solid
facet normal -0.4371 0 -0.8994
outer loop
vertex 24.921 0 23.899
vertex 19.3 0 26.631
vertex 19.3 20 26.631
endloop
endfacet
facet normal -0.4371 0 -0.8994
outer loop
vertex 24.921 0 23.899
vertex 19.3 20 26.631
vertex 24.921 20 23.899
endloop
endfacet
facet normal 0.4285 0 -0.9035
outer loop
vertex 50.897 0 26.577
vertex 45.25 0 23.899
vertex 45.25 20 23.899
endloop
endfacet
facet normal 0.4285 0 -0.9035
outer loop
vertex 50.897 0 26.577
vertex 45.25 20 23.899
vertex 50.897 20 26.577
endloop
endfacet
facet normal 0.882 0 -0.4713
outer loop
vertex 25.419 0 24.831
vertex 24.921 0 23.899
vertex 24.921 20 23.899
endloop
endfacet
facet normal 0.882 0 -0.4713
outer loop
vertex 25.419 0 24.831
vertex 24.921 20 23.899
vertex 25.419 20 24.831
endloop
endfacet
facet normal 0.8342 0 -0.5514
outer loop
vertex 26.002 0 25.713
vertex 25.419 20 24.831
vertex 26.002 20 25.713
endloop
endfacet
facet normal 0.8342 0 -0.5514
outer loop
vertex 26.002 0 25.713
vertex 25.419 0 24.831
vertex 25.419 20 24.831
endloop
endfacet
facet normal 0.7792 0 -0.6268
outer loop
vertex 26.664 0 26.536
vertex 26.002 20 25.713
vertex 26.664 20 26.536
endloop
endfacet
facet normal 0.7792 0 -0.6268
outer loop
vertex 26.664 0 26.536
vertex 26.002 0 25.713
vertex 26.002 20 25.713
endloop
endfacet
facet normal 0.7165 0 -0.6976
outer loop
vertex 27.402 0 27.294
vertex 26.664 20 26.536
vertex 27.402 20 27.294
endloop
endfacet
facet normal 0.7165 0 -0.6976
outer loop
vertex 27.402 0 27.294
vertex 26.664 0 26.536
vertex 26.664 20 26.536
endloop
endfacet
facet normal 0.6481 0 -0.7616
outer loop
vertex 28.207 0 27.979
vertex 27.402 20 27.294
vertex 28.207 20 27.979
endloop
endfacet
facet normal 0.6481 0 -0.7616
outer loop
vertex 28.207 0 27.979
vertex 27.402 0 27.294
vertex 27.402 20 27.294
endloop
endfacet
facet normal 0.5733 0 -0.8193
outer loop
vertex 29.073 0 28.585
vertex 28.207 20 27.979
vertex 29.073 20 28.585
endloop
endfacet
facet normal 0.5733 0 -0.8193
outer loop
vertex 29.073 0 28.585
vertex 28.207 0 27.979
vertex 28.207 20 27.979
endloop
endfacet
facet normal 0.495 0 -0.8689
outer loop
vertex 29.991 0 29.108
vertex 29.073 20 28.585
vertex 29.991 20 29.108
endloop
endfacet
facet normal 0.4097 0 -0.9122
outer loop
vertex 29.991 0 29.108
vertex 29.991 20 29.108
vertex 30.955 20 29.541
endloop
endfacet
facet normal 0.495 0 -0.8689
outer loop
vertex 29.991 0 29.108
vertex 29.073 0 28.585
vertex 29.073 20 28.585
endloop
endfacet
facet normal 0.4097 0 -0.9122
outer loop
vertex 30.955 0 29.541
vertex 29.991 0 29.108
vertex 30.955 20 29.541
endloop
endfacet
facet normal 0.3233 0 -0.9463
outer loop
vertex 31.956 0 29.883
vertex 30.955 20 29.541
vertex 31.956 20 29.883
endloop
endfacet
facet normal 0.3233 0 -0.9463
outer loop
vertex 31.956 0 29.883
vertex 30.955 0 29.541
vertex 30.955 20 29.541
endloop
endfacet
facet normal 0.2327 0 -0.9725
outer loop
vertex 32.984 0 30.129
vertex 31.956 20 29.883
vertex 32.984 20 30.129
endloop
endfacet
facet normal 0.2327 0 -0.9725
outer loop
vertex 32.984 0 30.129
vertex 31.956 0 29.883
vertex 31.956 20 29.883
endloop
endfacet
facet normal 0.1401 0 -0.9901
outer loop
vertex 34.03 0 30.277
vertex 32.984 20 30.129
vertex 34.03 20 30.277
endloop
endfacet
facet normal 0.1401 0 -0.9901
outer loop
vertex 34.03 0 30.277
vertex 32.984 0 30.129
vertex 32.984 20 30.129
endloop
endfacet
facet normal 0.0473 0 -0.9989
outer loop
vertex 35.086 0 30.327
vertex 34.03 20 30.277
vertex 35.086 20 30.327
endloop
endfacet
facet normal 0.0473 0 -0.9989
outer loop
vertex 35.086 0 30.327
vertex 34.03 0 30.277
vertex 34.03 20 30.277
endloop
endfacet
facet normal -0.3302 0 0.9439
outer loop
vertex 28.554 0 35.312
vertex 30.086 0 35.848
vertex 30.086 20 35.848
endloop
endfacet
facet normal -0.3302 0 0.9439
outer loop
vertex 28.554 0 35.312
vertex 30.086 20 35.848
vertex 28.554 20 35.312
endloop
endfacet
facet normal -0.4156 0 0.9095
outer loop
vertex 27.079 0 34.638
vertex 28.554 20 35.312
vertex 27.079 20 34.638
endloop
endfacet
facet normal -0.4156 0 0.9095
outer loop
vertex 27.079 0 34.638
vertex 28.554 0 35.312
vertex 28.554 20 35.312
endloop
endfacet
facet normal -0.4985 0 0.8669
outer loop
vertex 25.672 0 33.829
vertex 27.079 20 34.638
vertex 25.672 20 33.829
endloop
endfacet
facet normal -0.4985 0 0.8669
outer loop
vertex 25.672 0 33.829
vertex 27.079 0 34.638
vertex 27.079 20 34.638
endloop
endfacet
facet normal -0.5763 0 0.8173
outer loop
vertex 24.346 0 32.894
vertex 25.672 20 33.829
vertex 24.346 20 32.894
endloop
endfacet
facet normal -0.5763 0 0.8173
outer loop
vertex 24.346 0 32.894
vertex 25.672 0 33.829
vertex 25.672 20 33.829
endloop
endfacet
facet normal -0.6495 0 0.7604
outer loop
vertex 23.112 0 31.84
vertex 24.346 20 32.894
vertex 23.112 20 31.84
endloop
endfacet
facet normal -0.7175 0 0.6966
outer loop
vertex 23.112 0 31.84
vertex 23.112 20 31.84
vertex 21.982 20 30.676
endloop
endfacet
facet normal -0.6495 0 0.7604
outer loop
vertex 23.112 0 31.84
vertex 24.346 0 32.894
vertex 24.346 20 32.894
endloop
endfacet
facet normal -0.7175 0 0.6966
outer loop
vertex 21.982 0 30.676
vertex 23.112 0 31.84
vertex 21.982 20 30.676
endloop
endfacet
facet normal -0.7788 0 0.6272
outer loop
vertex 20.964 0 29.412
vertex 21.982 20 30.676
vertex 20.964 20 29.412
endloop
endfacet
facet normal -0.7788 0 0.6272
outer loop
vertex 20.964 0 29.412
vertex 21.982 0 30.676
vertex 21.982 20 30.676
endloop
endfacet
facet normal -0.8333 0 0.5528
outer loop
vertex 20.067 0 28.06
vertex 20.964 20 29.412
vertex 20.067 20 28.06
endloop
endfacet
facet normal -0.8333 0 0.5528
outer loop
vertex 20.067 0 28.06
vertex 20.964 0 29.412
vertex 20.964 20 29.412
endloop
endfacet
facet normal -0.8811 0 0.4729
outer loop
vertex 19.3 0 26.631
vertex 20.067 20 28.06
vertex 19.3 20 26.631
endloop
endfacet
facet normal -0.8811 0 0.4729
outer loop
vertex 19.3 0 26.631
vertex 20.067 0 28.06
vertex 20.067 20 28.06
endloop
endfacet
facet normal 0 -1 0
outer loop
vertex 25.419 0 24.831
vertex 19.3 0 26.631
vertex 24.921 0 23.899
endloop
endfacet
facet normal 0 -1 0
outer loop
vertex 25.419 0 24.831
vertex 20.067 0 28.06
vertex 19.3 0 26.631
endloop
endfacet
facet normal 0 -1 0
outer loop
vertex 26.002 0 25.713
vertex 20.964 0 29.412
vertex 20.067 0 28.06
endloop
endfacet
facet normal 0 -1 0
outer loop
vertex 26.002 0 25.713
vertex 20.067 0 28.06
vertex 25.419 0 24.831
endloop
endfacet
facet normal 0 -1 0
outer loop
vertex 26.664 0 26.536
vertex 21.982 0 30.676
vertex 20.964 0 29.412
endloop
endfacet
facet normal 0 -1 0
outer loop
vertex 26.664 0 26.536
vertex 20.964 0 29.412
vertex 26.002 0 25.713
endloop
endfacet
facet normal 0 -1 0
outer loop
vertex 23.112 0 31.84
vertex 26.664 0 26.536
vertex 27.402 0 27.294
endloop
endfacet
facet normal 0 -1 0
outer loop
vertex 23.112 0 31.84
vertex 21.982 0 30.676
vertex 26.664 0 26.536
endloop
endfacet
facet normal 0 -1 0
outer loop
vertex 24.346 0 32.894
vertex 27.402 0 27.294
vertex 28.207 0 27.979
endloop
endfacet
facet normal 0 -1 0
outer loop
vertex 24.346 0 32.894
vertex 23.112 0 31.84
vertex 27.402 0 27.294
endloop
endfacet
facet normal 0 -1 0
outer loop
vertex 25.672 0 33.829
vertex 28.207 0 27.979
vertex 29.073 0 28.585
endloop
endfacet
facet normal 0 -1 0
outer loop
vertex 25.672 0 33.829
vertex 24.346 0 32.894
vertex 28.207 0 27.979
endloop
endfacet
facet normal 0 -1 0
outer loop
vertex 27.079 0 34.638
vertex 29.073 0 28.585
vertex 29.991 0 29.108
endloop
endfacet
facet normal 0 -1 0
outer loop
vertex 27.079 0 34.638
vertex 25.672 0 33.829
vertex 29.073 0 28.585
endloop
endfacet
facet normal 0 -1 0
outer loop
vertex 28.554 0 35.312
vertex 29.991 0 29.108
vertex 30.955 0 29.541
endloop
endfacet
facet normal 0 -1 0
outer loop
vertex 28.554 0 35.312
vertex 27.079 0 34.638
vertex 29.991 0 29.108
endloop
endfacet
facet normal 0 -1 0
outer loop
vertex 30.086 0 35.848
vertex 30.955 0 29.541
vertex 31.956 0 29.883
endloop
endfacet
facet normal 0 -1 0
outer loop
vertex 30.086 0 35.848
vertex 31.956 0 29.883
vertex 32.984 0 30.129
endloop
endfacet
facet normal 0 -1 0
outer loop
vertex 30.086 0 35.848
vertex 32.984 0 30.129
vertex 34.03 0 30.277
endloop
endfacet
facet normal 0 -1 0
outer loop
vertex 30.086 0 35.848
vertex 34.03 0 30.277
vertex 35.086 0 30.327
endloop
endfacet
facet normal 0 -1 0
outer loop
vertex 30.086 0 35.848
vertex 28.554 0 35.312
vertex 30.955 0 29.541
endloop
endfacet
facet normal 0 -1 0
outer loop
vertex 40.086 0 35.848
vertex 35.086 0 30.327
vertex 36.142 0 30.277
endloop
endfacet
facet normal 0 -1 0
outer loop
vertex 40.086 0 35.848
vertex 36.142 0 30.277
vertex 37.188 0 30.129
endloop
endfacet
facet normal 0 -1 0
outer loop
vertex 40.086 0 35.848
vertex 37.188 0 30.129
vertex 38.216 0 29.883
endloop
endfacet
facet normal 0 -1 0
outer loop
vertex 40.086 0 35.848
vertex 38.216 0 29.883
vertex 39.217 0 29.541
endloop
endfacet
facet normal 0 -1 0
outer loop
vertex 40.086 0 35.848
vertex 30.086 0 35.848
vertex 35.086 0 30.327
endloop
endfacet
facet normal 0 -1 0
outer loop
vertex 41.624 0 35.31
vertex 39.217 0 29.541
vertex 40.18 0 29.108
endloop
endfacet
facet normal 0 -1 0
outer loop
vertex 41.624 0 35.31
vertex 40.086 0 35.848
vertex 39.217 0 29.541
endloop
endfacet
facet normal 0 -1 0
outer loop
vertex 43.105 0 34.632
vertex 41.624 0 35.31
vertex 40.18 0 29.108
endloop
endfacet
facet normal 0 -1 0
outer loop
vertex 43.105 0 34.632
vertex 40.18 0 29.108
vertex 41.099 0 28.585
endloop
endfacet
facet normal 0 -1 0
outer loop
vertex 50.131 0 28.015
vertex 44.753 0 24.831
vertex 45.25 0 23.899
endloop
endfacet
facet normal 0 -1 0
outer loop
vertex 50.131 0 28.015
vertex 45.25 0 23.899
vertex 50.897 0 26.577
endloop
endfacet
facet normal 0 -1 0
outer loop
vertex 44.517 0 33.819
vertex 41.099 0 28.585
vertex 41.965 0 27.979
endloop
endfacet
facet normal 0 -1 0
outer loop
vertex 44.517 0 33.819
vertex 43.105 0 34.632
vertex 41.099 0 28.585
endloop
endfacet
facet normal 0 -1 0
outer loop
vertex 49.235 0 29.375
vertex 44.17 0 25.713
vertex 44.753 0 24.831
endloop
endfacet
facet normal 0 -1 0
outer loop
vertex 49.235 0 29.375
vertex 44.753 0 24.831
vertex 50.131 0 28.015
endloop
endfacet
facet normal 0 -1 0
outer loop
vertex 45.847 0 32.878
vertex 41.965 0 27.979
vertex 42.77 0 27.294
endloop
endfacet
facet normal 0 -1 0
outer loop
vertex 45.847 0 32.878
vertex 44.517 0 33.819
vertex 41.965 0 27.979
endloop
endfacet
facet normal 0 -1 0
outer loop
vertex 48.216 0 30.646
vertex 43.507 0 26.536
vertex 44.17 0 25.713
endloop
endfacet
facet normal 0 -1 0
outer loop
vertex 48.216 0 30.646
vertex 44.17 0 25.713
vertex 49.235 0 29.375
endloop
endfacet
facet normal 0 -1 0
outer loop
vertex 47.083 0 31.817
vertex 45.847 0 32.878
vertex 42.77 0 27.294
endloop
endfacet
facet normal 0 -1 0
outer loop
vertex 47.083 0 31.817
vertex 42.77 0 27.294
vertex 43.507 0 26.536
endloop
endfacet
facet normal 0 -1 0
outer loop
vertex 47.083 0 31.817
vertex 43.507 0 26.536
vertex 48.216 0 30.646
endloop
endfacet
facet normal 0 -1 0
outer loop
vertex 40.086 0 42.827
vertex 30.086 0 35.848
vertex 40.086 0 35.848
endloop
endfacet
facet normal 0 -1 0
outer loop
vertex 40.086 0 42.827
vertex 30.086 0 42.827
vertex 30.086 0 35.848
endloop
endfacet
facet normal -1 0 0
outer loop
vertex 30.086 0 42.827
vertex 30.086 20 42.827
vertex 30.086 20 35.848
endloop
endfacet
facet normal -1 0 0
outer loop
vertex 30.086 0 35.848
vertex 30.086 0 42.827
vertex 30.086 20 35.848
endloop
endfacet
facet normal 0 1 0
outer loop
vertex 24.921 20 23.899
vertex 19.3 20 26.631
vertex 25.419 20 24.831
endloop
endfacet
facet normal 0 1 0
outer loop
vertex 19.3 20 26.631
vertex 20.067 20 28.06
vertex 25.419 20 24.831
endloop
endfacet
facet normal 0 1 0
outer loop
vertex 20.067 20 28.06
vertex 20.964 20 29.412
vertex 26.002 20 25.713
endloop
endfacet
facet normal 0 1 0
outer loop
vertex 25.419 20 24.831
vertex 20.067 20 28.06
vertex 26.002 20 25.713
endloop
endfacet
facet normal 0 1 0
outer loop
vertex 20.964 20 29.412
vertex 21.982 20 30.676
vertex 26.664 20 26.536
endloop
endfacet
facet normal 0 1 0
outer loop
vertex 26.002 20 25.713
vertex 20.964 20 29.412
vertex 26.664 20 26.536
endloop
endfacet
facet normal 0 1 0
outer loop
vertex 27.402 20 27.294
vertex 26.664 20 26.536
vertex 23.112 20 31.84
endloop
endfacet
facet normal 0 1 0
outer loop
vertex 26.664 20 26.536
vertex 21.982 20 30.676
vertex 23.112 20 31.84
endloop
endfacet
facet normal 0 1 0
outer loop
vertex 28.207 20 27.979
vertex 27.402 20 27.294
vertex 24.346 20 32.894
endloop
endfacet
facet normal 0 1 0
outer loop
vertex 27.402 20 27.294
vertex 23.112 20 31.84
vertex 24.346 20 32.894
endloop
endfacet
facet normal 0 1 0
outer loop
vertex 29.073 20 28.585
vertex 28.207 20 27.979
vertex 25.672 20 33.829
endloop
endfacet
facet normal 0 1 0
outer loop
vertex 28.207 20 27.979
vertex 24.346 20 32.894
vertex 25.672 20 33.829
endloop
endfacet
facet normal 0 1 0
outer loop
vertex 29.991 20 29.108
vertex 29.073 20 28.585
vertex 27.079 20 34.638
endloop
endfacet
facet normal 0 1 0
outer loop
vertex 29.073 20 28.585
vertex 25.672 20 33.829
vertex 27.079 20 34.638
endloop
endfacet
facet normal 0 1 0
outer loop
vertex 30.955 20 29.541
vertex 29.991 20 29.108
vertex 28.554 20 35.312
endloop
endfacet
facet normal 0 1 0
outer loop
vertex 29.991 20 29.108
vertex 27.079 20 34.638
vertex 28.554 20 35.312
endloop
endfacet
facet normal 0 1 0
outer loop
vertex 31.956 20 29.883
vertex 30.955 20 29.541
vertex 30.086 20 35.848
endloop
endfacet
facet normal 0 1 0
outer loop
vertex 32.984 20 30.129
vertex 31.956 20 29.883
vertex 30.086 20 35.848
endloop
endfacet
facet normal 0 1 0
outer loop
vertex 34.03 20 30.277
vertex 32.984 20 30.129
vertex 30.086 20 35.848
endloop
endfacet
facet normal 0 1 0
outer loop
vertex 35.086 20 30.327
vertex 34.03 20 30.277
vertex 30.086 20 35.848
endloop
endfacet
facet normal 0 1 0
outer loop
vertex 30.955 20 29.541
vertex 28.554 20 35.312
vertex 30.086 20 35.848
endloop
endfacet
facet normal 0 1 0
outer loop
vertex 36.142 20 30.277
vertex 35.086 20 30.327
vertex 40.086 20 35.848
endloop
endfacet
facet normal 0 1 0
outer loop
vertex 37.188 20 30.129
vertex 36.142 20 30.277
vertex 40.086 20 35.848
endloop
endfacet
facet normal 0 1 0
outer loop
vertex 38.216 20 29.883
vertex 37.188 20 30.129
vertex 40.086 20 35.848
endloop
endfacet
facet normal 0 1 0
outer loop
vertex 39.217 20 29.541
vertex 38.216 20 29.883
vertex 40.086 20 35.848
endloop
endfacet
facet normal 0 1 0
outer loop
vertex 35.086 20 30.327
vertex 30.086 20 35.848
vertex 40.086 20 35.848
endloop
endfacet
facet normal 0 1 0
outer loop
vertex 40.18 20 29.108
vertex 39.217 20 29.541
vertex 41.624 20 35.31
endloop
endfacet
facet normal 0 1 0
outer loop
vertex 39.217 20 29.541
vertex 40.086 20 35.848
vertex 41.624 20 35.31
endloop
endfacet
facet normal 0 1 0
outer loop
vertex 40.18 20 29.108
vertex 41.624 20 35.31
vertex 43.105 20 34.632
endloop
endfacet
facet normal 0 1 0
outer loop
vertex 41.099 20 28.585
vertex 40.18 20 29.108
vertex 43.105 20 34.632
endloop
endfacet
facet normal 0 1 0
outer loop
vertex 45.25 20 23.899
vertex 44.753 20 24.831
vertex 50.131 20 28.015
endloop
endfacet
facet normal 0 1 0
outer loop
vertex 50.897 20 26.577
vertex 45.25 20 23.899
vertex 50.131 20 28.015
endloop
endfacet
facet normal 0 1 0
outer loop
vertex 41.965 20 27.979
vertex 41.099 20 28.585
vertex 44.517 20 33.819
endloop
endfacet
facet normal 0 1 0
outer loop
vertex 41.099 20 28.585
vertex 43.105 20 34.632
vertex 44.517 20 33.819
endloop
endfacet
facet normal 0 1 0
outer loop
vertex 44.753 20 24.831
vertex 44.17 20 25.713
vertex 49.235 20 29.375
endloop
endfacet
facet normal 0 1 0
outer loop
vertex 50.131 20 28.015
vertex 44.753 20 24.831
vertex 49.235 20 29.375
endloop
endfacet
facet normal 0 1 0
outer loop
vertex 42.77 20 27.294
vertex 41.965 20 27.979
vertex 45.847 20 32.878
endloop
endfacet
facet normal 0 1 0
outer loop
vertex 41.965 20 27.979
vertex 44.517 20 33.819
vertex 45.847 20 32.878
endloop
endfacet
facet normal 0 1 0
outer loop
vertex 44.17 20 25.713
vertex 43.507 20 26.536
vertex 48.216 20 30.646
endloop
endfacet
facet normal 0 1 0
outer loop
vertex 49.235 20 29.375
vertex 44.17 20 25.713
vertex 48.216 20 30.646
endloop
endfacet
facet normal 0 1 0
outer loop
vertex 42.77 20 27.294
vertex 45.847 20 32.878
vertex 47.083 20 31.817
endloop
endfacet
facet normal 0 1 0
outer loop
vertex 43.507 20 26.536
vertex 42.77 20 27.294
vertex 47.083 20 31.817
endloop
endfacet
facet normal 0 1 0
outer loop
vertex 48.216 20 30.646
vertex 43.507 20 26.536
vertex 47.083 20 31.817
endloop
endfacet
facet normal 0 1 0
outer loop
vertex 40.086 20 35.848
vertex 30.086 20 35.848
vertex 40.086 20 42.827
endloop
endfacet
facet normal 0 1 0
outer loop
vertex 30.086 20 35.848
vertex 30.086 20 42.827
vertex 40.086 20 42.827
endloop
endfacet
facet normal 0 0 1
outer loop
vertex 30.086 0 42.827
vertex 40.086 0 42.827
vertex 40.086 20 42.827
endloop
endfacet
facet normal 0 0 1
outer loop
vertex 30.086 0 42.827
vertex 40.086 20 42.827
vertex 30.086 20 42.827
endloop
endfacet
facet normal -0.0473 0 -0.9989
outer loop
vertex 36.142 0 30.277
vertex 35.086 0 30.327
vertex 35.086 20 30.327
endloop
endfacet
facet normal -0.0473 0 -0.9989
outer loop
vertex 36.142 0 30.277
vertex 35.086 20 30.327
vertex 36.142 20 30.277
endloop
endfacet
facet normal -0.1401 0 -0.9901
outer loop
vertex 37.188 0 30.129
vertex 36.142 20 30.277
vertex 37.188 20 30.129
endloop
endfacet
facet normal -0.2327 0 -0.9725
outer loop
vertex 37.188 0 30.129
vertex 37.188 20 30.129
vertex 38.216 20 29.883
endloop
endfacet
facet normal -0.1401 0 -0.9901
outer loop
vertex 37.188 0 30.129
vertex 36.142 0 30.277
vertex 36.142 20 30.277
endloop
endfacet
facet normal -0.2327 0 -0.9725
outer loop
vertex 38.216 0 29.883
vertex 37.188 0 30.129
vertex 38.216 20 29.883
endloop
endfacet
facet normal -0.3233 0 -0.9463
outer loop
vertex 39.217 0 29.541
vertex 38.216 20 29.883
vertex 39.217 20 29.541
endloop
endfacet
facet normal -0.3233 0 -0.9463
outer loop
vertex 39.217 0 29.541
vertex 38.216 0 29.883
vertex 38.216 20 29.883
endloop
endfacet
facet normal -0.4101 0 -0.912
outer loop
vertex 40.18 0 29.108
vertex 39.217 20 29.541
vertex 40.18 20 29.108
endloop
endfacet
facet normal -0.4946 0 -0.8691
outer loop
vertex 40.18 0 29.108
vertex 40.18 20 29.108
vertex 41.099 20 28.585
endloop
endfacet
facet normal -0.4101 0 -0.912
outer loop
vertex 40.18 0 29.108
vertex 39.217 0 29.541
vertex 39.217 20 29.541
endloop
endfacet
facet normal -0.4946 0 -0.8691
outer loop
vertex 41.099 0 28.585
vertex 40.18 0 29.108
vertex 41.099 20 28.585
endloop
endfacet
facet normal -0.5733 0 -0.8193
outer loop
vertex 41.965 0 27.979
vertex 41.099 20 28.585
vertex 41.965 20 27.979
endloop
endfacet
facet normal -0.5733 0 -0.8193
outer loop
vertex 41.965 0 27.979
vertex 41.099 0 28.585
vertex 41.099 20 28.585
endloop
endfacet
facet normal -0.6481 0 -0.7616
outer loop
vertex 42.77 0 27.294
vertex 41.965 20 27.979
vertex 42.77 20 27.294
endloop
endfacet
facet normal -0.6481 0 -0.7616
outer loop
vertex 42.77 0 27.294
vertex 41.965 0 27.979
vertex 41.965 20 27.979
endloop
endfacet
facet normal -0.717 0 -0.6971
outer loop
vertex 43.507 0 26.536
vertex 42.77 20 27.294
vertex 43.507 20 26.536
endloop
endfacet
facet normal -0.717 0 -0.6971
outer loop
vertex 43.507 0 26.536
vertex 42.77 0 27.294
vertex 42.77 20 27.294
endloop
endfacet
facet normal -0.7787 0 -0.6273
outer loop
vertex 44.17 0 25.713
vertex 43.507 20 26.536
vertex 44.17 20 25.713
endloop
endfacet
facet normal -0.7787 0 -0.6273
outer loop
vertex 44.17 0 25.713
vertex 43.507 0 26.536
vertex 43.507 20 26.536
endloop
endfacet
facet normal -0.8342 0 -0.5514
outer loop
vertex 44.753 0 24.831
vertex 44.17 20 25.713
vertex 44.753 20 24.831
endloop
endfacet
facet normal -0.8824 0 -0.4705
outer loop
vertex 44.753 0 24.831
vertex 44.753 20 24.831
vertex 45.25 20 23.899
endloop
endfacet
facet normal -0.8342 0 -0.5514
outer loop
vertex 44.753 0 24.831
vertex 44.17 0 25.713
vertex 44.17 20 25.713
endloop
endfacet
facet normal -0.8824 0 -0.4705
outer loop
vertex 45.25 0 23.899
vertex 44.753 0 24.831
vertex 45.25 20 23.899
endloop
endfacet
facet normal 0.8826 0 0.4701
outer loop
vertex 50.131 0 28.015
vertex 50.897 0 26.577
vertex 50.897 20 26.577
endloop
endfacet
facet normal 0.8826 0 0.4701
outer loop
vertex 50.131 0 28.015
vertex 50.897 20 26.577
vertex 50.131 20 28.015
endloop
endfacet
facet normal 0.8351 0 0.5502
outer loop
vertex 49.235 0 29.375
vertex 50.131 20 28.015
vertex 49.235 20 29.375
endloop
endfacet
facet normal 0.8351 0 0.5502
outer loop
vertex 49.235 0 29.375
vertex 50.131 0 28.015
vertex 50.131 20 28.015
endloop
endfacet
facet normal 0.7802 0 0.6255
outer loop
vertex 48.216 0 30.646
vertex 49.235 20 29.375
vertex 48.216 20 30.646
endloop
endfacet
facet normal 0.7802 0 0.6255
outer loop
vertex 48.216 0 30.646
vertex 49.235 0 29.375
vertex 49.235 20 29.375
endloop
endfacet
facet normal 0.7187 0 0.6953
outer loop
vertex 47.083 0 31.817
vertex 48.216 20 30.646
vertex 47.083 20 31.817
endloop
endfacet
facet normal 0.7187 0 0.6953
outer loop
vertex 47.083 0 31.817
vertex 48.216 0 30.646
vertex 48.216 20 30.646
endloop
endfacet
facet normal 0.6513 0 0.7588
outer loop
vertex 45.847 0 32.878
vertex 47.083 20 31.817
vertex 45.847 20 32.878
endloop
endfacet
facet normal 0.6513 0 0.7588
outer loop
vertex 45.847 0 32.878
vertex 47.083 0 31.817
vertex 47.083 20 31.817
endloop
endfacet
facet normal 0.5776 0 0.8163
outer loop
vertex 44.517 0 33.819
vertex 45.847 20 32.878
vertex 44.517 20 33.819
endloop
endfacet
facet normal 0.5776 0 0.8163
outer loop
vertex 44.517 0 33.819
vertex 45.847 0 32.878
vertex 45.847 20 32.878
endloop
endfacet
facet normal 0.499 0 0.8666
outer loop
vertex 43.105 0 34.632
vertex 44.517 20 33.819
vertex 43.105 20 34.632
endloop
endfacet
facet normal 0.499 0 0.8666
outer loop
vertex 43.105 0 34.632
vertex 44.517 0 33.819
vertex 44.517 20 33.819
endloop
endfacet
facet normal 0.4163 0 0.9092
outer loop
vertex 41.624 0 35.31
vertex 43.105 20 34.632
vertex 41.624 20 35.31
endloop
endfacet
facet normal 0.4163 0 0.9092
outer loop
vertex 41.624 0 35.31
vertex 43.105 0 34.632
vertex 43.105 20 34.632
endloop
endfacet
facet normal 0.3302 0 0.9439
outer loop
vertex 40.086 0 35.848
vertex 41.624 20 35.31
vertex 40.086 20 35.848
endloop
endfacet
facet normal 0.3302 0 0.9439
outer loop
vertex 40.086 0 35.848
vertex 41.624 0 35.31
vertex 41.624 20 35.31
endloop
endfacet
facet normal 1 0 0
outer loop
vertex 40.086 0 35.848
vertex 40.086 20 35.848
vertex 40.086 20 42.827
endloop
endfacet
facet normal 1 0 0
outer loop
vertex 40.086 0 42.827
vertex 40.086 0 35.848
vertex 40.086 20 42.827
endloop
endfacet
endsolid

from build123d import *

# Parameters (mm, degrees)
F1_DEPTH = 20


with BuildPart() as f1:
    # F0 (on Front) → F1 (new body)
    with BuildSketch(Plane.XZ):
        with BuildLine():
            Line((19.2999951541, 26.6305115074), (24.9214912266, 23.8985655014))
            ThreePointArc((24.9214912266, 23.8985655014), (29.0725771912, 28.5851222957), (35.0859551343, 30.32713693))
            Line((35.0859551343, 30.32713693), (30.0859551343, 30.32713693))
            Line((30.0859551343, 30.32713693), (30.0859551343, 35.8476467612))
            ThreePointArc((30.0859551343, 35.8476467612), (23.7170093324, 32.38116156), (19.2999951541, 26.6305115074))
        make_face()
        with BuildLine():
            Line((30.0859551343, 30.32713693), (35.0859551343, 30.32713693))
            Line((35.0859551343, 30.32713693), (40.0859551343, 30.32713693))
            Line((40.0859551343, 30.32713693), (40.0859551343, 35.8476467612))
            ThreePointArc((40.0859551343, 35.8476467612), (35.0859551343, 36.57713693), (30.0859551343, 35.8476467612))
            Line((30.0859551343, 35.8476467612), (30.0859551343, 30.32713693))
        make_face()
        with BuildLine():
            Line((30.0859551343, 42.82713693), (30.0859551343, 35.8476467612))
            ThreePointArc((30.0859551343, 35.8476467612), (35.0859551343, 36.57713693), (40.0859551343, 35.8476467612))
            Line((40.0859551343, 35.8476467612), (40.0859551343, 42.82713693))
            Line((40.0859551343, 42.82713693), (30.0859551343, 42.82713693))
        make_face()
        with BuildLine():
            Line((40.0859551343, 30.32713693), (35.0859551343, 30.32713693))
            ThreePointArc((35.0859551343, 30.32713693), (41.0993330773, 28.5851222957), (45.2504190419, 23.8985655014))
            Line((45.2504190419, 23.8985655014), (50.8973434351, 26.57713693))
            ThreePointArc((50.8973434351, 26.57713693), (46.477357984, 32.3619380619), (40.0859551343, 35.8476467612))
            Line((40.0859551343, 35.8476467612), (40.0859551343, 30.32713693))
        make_face()
    extrude(amount=-F1_DEPTH)


solid = f1.part
